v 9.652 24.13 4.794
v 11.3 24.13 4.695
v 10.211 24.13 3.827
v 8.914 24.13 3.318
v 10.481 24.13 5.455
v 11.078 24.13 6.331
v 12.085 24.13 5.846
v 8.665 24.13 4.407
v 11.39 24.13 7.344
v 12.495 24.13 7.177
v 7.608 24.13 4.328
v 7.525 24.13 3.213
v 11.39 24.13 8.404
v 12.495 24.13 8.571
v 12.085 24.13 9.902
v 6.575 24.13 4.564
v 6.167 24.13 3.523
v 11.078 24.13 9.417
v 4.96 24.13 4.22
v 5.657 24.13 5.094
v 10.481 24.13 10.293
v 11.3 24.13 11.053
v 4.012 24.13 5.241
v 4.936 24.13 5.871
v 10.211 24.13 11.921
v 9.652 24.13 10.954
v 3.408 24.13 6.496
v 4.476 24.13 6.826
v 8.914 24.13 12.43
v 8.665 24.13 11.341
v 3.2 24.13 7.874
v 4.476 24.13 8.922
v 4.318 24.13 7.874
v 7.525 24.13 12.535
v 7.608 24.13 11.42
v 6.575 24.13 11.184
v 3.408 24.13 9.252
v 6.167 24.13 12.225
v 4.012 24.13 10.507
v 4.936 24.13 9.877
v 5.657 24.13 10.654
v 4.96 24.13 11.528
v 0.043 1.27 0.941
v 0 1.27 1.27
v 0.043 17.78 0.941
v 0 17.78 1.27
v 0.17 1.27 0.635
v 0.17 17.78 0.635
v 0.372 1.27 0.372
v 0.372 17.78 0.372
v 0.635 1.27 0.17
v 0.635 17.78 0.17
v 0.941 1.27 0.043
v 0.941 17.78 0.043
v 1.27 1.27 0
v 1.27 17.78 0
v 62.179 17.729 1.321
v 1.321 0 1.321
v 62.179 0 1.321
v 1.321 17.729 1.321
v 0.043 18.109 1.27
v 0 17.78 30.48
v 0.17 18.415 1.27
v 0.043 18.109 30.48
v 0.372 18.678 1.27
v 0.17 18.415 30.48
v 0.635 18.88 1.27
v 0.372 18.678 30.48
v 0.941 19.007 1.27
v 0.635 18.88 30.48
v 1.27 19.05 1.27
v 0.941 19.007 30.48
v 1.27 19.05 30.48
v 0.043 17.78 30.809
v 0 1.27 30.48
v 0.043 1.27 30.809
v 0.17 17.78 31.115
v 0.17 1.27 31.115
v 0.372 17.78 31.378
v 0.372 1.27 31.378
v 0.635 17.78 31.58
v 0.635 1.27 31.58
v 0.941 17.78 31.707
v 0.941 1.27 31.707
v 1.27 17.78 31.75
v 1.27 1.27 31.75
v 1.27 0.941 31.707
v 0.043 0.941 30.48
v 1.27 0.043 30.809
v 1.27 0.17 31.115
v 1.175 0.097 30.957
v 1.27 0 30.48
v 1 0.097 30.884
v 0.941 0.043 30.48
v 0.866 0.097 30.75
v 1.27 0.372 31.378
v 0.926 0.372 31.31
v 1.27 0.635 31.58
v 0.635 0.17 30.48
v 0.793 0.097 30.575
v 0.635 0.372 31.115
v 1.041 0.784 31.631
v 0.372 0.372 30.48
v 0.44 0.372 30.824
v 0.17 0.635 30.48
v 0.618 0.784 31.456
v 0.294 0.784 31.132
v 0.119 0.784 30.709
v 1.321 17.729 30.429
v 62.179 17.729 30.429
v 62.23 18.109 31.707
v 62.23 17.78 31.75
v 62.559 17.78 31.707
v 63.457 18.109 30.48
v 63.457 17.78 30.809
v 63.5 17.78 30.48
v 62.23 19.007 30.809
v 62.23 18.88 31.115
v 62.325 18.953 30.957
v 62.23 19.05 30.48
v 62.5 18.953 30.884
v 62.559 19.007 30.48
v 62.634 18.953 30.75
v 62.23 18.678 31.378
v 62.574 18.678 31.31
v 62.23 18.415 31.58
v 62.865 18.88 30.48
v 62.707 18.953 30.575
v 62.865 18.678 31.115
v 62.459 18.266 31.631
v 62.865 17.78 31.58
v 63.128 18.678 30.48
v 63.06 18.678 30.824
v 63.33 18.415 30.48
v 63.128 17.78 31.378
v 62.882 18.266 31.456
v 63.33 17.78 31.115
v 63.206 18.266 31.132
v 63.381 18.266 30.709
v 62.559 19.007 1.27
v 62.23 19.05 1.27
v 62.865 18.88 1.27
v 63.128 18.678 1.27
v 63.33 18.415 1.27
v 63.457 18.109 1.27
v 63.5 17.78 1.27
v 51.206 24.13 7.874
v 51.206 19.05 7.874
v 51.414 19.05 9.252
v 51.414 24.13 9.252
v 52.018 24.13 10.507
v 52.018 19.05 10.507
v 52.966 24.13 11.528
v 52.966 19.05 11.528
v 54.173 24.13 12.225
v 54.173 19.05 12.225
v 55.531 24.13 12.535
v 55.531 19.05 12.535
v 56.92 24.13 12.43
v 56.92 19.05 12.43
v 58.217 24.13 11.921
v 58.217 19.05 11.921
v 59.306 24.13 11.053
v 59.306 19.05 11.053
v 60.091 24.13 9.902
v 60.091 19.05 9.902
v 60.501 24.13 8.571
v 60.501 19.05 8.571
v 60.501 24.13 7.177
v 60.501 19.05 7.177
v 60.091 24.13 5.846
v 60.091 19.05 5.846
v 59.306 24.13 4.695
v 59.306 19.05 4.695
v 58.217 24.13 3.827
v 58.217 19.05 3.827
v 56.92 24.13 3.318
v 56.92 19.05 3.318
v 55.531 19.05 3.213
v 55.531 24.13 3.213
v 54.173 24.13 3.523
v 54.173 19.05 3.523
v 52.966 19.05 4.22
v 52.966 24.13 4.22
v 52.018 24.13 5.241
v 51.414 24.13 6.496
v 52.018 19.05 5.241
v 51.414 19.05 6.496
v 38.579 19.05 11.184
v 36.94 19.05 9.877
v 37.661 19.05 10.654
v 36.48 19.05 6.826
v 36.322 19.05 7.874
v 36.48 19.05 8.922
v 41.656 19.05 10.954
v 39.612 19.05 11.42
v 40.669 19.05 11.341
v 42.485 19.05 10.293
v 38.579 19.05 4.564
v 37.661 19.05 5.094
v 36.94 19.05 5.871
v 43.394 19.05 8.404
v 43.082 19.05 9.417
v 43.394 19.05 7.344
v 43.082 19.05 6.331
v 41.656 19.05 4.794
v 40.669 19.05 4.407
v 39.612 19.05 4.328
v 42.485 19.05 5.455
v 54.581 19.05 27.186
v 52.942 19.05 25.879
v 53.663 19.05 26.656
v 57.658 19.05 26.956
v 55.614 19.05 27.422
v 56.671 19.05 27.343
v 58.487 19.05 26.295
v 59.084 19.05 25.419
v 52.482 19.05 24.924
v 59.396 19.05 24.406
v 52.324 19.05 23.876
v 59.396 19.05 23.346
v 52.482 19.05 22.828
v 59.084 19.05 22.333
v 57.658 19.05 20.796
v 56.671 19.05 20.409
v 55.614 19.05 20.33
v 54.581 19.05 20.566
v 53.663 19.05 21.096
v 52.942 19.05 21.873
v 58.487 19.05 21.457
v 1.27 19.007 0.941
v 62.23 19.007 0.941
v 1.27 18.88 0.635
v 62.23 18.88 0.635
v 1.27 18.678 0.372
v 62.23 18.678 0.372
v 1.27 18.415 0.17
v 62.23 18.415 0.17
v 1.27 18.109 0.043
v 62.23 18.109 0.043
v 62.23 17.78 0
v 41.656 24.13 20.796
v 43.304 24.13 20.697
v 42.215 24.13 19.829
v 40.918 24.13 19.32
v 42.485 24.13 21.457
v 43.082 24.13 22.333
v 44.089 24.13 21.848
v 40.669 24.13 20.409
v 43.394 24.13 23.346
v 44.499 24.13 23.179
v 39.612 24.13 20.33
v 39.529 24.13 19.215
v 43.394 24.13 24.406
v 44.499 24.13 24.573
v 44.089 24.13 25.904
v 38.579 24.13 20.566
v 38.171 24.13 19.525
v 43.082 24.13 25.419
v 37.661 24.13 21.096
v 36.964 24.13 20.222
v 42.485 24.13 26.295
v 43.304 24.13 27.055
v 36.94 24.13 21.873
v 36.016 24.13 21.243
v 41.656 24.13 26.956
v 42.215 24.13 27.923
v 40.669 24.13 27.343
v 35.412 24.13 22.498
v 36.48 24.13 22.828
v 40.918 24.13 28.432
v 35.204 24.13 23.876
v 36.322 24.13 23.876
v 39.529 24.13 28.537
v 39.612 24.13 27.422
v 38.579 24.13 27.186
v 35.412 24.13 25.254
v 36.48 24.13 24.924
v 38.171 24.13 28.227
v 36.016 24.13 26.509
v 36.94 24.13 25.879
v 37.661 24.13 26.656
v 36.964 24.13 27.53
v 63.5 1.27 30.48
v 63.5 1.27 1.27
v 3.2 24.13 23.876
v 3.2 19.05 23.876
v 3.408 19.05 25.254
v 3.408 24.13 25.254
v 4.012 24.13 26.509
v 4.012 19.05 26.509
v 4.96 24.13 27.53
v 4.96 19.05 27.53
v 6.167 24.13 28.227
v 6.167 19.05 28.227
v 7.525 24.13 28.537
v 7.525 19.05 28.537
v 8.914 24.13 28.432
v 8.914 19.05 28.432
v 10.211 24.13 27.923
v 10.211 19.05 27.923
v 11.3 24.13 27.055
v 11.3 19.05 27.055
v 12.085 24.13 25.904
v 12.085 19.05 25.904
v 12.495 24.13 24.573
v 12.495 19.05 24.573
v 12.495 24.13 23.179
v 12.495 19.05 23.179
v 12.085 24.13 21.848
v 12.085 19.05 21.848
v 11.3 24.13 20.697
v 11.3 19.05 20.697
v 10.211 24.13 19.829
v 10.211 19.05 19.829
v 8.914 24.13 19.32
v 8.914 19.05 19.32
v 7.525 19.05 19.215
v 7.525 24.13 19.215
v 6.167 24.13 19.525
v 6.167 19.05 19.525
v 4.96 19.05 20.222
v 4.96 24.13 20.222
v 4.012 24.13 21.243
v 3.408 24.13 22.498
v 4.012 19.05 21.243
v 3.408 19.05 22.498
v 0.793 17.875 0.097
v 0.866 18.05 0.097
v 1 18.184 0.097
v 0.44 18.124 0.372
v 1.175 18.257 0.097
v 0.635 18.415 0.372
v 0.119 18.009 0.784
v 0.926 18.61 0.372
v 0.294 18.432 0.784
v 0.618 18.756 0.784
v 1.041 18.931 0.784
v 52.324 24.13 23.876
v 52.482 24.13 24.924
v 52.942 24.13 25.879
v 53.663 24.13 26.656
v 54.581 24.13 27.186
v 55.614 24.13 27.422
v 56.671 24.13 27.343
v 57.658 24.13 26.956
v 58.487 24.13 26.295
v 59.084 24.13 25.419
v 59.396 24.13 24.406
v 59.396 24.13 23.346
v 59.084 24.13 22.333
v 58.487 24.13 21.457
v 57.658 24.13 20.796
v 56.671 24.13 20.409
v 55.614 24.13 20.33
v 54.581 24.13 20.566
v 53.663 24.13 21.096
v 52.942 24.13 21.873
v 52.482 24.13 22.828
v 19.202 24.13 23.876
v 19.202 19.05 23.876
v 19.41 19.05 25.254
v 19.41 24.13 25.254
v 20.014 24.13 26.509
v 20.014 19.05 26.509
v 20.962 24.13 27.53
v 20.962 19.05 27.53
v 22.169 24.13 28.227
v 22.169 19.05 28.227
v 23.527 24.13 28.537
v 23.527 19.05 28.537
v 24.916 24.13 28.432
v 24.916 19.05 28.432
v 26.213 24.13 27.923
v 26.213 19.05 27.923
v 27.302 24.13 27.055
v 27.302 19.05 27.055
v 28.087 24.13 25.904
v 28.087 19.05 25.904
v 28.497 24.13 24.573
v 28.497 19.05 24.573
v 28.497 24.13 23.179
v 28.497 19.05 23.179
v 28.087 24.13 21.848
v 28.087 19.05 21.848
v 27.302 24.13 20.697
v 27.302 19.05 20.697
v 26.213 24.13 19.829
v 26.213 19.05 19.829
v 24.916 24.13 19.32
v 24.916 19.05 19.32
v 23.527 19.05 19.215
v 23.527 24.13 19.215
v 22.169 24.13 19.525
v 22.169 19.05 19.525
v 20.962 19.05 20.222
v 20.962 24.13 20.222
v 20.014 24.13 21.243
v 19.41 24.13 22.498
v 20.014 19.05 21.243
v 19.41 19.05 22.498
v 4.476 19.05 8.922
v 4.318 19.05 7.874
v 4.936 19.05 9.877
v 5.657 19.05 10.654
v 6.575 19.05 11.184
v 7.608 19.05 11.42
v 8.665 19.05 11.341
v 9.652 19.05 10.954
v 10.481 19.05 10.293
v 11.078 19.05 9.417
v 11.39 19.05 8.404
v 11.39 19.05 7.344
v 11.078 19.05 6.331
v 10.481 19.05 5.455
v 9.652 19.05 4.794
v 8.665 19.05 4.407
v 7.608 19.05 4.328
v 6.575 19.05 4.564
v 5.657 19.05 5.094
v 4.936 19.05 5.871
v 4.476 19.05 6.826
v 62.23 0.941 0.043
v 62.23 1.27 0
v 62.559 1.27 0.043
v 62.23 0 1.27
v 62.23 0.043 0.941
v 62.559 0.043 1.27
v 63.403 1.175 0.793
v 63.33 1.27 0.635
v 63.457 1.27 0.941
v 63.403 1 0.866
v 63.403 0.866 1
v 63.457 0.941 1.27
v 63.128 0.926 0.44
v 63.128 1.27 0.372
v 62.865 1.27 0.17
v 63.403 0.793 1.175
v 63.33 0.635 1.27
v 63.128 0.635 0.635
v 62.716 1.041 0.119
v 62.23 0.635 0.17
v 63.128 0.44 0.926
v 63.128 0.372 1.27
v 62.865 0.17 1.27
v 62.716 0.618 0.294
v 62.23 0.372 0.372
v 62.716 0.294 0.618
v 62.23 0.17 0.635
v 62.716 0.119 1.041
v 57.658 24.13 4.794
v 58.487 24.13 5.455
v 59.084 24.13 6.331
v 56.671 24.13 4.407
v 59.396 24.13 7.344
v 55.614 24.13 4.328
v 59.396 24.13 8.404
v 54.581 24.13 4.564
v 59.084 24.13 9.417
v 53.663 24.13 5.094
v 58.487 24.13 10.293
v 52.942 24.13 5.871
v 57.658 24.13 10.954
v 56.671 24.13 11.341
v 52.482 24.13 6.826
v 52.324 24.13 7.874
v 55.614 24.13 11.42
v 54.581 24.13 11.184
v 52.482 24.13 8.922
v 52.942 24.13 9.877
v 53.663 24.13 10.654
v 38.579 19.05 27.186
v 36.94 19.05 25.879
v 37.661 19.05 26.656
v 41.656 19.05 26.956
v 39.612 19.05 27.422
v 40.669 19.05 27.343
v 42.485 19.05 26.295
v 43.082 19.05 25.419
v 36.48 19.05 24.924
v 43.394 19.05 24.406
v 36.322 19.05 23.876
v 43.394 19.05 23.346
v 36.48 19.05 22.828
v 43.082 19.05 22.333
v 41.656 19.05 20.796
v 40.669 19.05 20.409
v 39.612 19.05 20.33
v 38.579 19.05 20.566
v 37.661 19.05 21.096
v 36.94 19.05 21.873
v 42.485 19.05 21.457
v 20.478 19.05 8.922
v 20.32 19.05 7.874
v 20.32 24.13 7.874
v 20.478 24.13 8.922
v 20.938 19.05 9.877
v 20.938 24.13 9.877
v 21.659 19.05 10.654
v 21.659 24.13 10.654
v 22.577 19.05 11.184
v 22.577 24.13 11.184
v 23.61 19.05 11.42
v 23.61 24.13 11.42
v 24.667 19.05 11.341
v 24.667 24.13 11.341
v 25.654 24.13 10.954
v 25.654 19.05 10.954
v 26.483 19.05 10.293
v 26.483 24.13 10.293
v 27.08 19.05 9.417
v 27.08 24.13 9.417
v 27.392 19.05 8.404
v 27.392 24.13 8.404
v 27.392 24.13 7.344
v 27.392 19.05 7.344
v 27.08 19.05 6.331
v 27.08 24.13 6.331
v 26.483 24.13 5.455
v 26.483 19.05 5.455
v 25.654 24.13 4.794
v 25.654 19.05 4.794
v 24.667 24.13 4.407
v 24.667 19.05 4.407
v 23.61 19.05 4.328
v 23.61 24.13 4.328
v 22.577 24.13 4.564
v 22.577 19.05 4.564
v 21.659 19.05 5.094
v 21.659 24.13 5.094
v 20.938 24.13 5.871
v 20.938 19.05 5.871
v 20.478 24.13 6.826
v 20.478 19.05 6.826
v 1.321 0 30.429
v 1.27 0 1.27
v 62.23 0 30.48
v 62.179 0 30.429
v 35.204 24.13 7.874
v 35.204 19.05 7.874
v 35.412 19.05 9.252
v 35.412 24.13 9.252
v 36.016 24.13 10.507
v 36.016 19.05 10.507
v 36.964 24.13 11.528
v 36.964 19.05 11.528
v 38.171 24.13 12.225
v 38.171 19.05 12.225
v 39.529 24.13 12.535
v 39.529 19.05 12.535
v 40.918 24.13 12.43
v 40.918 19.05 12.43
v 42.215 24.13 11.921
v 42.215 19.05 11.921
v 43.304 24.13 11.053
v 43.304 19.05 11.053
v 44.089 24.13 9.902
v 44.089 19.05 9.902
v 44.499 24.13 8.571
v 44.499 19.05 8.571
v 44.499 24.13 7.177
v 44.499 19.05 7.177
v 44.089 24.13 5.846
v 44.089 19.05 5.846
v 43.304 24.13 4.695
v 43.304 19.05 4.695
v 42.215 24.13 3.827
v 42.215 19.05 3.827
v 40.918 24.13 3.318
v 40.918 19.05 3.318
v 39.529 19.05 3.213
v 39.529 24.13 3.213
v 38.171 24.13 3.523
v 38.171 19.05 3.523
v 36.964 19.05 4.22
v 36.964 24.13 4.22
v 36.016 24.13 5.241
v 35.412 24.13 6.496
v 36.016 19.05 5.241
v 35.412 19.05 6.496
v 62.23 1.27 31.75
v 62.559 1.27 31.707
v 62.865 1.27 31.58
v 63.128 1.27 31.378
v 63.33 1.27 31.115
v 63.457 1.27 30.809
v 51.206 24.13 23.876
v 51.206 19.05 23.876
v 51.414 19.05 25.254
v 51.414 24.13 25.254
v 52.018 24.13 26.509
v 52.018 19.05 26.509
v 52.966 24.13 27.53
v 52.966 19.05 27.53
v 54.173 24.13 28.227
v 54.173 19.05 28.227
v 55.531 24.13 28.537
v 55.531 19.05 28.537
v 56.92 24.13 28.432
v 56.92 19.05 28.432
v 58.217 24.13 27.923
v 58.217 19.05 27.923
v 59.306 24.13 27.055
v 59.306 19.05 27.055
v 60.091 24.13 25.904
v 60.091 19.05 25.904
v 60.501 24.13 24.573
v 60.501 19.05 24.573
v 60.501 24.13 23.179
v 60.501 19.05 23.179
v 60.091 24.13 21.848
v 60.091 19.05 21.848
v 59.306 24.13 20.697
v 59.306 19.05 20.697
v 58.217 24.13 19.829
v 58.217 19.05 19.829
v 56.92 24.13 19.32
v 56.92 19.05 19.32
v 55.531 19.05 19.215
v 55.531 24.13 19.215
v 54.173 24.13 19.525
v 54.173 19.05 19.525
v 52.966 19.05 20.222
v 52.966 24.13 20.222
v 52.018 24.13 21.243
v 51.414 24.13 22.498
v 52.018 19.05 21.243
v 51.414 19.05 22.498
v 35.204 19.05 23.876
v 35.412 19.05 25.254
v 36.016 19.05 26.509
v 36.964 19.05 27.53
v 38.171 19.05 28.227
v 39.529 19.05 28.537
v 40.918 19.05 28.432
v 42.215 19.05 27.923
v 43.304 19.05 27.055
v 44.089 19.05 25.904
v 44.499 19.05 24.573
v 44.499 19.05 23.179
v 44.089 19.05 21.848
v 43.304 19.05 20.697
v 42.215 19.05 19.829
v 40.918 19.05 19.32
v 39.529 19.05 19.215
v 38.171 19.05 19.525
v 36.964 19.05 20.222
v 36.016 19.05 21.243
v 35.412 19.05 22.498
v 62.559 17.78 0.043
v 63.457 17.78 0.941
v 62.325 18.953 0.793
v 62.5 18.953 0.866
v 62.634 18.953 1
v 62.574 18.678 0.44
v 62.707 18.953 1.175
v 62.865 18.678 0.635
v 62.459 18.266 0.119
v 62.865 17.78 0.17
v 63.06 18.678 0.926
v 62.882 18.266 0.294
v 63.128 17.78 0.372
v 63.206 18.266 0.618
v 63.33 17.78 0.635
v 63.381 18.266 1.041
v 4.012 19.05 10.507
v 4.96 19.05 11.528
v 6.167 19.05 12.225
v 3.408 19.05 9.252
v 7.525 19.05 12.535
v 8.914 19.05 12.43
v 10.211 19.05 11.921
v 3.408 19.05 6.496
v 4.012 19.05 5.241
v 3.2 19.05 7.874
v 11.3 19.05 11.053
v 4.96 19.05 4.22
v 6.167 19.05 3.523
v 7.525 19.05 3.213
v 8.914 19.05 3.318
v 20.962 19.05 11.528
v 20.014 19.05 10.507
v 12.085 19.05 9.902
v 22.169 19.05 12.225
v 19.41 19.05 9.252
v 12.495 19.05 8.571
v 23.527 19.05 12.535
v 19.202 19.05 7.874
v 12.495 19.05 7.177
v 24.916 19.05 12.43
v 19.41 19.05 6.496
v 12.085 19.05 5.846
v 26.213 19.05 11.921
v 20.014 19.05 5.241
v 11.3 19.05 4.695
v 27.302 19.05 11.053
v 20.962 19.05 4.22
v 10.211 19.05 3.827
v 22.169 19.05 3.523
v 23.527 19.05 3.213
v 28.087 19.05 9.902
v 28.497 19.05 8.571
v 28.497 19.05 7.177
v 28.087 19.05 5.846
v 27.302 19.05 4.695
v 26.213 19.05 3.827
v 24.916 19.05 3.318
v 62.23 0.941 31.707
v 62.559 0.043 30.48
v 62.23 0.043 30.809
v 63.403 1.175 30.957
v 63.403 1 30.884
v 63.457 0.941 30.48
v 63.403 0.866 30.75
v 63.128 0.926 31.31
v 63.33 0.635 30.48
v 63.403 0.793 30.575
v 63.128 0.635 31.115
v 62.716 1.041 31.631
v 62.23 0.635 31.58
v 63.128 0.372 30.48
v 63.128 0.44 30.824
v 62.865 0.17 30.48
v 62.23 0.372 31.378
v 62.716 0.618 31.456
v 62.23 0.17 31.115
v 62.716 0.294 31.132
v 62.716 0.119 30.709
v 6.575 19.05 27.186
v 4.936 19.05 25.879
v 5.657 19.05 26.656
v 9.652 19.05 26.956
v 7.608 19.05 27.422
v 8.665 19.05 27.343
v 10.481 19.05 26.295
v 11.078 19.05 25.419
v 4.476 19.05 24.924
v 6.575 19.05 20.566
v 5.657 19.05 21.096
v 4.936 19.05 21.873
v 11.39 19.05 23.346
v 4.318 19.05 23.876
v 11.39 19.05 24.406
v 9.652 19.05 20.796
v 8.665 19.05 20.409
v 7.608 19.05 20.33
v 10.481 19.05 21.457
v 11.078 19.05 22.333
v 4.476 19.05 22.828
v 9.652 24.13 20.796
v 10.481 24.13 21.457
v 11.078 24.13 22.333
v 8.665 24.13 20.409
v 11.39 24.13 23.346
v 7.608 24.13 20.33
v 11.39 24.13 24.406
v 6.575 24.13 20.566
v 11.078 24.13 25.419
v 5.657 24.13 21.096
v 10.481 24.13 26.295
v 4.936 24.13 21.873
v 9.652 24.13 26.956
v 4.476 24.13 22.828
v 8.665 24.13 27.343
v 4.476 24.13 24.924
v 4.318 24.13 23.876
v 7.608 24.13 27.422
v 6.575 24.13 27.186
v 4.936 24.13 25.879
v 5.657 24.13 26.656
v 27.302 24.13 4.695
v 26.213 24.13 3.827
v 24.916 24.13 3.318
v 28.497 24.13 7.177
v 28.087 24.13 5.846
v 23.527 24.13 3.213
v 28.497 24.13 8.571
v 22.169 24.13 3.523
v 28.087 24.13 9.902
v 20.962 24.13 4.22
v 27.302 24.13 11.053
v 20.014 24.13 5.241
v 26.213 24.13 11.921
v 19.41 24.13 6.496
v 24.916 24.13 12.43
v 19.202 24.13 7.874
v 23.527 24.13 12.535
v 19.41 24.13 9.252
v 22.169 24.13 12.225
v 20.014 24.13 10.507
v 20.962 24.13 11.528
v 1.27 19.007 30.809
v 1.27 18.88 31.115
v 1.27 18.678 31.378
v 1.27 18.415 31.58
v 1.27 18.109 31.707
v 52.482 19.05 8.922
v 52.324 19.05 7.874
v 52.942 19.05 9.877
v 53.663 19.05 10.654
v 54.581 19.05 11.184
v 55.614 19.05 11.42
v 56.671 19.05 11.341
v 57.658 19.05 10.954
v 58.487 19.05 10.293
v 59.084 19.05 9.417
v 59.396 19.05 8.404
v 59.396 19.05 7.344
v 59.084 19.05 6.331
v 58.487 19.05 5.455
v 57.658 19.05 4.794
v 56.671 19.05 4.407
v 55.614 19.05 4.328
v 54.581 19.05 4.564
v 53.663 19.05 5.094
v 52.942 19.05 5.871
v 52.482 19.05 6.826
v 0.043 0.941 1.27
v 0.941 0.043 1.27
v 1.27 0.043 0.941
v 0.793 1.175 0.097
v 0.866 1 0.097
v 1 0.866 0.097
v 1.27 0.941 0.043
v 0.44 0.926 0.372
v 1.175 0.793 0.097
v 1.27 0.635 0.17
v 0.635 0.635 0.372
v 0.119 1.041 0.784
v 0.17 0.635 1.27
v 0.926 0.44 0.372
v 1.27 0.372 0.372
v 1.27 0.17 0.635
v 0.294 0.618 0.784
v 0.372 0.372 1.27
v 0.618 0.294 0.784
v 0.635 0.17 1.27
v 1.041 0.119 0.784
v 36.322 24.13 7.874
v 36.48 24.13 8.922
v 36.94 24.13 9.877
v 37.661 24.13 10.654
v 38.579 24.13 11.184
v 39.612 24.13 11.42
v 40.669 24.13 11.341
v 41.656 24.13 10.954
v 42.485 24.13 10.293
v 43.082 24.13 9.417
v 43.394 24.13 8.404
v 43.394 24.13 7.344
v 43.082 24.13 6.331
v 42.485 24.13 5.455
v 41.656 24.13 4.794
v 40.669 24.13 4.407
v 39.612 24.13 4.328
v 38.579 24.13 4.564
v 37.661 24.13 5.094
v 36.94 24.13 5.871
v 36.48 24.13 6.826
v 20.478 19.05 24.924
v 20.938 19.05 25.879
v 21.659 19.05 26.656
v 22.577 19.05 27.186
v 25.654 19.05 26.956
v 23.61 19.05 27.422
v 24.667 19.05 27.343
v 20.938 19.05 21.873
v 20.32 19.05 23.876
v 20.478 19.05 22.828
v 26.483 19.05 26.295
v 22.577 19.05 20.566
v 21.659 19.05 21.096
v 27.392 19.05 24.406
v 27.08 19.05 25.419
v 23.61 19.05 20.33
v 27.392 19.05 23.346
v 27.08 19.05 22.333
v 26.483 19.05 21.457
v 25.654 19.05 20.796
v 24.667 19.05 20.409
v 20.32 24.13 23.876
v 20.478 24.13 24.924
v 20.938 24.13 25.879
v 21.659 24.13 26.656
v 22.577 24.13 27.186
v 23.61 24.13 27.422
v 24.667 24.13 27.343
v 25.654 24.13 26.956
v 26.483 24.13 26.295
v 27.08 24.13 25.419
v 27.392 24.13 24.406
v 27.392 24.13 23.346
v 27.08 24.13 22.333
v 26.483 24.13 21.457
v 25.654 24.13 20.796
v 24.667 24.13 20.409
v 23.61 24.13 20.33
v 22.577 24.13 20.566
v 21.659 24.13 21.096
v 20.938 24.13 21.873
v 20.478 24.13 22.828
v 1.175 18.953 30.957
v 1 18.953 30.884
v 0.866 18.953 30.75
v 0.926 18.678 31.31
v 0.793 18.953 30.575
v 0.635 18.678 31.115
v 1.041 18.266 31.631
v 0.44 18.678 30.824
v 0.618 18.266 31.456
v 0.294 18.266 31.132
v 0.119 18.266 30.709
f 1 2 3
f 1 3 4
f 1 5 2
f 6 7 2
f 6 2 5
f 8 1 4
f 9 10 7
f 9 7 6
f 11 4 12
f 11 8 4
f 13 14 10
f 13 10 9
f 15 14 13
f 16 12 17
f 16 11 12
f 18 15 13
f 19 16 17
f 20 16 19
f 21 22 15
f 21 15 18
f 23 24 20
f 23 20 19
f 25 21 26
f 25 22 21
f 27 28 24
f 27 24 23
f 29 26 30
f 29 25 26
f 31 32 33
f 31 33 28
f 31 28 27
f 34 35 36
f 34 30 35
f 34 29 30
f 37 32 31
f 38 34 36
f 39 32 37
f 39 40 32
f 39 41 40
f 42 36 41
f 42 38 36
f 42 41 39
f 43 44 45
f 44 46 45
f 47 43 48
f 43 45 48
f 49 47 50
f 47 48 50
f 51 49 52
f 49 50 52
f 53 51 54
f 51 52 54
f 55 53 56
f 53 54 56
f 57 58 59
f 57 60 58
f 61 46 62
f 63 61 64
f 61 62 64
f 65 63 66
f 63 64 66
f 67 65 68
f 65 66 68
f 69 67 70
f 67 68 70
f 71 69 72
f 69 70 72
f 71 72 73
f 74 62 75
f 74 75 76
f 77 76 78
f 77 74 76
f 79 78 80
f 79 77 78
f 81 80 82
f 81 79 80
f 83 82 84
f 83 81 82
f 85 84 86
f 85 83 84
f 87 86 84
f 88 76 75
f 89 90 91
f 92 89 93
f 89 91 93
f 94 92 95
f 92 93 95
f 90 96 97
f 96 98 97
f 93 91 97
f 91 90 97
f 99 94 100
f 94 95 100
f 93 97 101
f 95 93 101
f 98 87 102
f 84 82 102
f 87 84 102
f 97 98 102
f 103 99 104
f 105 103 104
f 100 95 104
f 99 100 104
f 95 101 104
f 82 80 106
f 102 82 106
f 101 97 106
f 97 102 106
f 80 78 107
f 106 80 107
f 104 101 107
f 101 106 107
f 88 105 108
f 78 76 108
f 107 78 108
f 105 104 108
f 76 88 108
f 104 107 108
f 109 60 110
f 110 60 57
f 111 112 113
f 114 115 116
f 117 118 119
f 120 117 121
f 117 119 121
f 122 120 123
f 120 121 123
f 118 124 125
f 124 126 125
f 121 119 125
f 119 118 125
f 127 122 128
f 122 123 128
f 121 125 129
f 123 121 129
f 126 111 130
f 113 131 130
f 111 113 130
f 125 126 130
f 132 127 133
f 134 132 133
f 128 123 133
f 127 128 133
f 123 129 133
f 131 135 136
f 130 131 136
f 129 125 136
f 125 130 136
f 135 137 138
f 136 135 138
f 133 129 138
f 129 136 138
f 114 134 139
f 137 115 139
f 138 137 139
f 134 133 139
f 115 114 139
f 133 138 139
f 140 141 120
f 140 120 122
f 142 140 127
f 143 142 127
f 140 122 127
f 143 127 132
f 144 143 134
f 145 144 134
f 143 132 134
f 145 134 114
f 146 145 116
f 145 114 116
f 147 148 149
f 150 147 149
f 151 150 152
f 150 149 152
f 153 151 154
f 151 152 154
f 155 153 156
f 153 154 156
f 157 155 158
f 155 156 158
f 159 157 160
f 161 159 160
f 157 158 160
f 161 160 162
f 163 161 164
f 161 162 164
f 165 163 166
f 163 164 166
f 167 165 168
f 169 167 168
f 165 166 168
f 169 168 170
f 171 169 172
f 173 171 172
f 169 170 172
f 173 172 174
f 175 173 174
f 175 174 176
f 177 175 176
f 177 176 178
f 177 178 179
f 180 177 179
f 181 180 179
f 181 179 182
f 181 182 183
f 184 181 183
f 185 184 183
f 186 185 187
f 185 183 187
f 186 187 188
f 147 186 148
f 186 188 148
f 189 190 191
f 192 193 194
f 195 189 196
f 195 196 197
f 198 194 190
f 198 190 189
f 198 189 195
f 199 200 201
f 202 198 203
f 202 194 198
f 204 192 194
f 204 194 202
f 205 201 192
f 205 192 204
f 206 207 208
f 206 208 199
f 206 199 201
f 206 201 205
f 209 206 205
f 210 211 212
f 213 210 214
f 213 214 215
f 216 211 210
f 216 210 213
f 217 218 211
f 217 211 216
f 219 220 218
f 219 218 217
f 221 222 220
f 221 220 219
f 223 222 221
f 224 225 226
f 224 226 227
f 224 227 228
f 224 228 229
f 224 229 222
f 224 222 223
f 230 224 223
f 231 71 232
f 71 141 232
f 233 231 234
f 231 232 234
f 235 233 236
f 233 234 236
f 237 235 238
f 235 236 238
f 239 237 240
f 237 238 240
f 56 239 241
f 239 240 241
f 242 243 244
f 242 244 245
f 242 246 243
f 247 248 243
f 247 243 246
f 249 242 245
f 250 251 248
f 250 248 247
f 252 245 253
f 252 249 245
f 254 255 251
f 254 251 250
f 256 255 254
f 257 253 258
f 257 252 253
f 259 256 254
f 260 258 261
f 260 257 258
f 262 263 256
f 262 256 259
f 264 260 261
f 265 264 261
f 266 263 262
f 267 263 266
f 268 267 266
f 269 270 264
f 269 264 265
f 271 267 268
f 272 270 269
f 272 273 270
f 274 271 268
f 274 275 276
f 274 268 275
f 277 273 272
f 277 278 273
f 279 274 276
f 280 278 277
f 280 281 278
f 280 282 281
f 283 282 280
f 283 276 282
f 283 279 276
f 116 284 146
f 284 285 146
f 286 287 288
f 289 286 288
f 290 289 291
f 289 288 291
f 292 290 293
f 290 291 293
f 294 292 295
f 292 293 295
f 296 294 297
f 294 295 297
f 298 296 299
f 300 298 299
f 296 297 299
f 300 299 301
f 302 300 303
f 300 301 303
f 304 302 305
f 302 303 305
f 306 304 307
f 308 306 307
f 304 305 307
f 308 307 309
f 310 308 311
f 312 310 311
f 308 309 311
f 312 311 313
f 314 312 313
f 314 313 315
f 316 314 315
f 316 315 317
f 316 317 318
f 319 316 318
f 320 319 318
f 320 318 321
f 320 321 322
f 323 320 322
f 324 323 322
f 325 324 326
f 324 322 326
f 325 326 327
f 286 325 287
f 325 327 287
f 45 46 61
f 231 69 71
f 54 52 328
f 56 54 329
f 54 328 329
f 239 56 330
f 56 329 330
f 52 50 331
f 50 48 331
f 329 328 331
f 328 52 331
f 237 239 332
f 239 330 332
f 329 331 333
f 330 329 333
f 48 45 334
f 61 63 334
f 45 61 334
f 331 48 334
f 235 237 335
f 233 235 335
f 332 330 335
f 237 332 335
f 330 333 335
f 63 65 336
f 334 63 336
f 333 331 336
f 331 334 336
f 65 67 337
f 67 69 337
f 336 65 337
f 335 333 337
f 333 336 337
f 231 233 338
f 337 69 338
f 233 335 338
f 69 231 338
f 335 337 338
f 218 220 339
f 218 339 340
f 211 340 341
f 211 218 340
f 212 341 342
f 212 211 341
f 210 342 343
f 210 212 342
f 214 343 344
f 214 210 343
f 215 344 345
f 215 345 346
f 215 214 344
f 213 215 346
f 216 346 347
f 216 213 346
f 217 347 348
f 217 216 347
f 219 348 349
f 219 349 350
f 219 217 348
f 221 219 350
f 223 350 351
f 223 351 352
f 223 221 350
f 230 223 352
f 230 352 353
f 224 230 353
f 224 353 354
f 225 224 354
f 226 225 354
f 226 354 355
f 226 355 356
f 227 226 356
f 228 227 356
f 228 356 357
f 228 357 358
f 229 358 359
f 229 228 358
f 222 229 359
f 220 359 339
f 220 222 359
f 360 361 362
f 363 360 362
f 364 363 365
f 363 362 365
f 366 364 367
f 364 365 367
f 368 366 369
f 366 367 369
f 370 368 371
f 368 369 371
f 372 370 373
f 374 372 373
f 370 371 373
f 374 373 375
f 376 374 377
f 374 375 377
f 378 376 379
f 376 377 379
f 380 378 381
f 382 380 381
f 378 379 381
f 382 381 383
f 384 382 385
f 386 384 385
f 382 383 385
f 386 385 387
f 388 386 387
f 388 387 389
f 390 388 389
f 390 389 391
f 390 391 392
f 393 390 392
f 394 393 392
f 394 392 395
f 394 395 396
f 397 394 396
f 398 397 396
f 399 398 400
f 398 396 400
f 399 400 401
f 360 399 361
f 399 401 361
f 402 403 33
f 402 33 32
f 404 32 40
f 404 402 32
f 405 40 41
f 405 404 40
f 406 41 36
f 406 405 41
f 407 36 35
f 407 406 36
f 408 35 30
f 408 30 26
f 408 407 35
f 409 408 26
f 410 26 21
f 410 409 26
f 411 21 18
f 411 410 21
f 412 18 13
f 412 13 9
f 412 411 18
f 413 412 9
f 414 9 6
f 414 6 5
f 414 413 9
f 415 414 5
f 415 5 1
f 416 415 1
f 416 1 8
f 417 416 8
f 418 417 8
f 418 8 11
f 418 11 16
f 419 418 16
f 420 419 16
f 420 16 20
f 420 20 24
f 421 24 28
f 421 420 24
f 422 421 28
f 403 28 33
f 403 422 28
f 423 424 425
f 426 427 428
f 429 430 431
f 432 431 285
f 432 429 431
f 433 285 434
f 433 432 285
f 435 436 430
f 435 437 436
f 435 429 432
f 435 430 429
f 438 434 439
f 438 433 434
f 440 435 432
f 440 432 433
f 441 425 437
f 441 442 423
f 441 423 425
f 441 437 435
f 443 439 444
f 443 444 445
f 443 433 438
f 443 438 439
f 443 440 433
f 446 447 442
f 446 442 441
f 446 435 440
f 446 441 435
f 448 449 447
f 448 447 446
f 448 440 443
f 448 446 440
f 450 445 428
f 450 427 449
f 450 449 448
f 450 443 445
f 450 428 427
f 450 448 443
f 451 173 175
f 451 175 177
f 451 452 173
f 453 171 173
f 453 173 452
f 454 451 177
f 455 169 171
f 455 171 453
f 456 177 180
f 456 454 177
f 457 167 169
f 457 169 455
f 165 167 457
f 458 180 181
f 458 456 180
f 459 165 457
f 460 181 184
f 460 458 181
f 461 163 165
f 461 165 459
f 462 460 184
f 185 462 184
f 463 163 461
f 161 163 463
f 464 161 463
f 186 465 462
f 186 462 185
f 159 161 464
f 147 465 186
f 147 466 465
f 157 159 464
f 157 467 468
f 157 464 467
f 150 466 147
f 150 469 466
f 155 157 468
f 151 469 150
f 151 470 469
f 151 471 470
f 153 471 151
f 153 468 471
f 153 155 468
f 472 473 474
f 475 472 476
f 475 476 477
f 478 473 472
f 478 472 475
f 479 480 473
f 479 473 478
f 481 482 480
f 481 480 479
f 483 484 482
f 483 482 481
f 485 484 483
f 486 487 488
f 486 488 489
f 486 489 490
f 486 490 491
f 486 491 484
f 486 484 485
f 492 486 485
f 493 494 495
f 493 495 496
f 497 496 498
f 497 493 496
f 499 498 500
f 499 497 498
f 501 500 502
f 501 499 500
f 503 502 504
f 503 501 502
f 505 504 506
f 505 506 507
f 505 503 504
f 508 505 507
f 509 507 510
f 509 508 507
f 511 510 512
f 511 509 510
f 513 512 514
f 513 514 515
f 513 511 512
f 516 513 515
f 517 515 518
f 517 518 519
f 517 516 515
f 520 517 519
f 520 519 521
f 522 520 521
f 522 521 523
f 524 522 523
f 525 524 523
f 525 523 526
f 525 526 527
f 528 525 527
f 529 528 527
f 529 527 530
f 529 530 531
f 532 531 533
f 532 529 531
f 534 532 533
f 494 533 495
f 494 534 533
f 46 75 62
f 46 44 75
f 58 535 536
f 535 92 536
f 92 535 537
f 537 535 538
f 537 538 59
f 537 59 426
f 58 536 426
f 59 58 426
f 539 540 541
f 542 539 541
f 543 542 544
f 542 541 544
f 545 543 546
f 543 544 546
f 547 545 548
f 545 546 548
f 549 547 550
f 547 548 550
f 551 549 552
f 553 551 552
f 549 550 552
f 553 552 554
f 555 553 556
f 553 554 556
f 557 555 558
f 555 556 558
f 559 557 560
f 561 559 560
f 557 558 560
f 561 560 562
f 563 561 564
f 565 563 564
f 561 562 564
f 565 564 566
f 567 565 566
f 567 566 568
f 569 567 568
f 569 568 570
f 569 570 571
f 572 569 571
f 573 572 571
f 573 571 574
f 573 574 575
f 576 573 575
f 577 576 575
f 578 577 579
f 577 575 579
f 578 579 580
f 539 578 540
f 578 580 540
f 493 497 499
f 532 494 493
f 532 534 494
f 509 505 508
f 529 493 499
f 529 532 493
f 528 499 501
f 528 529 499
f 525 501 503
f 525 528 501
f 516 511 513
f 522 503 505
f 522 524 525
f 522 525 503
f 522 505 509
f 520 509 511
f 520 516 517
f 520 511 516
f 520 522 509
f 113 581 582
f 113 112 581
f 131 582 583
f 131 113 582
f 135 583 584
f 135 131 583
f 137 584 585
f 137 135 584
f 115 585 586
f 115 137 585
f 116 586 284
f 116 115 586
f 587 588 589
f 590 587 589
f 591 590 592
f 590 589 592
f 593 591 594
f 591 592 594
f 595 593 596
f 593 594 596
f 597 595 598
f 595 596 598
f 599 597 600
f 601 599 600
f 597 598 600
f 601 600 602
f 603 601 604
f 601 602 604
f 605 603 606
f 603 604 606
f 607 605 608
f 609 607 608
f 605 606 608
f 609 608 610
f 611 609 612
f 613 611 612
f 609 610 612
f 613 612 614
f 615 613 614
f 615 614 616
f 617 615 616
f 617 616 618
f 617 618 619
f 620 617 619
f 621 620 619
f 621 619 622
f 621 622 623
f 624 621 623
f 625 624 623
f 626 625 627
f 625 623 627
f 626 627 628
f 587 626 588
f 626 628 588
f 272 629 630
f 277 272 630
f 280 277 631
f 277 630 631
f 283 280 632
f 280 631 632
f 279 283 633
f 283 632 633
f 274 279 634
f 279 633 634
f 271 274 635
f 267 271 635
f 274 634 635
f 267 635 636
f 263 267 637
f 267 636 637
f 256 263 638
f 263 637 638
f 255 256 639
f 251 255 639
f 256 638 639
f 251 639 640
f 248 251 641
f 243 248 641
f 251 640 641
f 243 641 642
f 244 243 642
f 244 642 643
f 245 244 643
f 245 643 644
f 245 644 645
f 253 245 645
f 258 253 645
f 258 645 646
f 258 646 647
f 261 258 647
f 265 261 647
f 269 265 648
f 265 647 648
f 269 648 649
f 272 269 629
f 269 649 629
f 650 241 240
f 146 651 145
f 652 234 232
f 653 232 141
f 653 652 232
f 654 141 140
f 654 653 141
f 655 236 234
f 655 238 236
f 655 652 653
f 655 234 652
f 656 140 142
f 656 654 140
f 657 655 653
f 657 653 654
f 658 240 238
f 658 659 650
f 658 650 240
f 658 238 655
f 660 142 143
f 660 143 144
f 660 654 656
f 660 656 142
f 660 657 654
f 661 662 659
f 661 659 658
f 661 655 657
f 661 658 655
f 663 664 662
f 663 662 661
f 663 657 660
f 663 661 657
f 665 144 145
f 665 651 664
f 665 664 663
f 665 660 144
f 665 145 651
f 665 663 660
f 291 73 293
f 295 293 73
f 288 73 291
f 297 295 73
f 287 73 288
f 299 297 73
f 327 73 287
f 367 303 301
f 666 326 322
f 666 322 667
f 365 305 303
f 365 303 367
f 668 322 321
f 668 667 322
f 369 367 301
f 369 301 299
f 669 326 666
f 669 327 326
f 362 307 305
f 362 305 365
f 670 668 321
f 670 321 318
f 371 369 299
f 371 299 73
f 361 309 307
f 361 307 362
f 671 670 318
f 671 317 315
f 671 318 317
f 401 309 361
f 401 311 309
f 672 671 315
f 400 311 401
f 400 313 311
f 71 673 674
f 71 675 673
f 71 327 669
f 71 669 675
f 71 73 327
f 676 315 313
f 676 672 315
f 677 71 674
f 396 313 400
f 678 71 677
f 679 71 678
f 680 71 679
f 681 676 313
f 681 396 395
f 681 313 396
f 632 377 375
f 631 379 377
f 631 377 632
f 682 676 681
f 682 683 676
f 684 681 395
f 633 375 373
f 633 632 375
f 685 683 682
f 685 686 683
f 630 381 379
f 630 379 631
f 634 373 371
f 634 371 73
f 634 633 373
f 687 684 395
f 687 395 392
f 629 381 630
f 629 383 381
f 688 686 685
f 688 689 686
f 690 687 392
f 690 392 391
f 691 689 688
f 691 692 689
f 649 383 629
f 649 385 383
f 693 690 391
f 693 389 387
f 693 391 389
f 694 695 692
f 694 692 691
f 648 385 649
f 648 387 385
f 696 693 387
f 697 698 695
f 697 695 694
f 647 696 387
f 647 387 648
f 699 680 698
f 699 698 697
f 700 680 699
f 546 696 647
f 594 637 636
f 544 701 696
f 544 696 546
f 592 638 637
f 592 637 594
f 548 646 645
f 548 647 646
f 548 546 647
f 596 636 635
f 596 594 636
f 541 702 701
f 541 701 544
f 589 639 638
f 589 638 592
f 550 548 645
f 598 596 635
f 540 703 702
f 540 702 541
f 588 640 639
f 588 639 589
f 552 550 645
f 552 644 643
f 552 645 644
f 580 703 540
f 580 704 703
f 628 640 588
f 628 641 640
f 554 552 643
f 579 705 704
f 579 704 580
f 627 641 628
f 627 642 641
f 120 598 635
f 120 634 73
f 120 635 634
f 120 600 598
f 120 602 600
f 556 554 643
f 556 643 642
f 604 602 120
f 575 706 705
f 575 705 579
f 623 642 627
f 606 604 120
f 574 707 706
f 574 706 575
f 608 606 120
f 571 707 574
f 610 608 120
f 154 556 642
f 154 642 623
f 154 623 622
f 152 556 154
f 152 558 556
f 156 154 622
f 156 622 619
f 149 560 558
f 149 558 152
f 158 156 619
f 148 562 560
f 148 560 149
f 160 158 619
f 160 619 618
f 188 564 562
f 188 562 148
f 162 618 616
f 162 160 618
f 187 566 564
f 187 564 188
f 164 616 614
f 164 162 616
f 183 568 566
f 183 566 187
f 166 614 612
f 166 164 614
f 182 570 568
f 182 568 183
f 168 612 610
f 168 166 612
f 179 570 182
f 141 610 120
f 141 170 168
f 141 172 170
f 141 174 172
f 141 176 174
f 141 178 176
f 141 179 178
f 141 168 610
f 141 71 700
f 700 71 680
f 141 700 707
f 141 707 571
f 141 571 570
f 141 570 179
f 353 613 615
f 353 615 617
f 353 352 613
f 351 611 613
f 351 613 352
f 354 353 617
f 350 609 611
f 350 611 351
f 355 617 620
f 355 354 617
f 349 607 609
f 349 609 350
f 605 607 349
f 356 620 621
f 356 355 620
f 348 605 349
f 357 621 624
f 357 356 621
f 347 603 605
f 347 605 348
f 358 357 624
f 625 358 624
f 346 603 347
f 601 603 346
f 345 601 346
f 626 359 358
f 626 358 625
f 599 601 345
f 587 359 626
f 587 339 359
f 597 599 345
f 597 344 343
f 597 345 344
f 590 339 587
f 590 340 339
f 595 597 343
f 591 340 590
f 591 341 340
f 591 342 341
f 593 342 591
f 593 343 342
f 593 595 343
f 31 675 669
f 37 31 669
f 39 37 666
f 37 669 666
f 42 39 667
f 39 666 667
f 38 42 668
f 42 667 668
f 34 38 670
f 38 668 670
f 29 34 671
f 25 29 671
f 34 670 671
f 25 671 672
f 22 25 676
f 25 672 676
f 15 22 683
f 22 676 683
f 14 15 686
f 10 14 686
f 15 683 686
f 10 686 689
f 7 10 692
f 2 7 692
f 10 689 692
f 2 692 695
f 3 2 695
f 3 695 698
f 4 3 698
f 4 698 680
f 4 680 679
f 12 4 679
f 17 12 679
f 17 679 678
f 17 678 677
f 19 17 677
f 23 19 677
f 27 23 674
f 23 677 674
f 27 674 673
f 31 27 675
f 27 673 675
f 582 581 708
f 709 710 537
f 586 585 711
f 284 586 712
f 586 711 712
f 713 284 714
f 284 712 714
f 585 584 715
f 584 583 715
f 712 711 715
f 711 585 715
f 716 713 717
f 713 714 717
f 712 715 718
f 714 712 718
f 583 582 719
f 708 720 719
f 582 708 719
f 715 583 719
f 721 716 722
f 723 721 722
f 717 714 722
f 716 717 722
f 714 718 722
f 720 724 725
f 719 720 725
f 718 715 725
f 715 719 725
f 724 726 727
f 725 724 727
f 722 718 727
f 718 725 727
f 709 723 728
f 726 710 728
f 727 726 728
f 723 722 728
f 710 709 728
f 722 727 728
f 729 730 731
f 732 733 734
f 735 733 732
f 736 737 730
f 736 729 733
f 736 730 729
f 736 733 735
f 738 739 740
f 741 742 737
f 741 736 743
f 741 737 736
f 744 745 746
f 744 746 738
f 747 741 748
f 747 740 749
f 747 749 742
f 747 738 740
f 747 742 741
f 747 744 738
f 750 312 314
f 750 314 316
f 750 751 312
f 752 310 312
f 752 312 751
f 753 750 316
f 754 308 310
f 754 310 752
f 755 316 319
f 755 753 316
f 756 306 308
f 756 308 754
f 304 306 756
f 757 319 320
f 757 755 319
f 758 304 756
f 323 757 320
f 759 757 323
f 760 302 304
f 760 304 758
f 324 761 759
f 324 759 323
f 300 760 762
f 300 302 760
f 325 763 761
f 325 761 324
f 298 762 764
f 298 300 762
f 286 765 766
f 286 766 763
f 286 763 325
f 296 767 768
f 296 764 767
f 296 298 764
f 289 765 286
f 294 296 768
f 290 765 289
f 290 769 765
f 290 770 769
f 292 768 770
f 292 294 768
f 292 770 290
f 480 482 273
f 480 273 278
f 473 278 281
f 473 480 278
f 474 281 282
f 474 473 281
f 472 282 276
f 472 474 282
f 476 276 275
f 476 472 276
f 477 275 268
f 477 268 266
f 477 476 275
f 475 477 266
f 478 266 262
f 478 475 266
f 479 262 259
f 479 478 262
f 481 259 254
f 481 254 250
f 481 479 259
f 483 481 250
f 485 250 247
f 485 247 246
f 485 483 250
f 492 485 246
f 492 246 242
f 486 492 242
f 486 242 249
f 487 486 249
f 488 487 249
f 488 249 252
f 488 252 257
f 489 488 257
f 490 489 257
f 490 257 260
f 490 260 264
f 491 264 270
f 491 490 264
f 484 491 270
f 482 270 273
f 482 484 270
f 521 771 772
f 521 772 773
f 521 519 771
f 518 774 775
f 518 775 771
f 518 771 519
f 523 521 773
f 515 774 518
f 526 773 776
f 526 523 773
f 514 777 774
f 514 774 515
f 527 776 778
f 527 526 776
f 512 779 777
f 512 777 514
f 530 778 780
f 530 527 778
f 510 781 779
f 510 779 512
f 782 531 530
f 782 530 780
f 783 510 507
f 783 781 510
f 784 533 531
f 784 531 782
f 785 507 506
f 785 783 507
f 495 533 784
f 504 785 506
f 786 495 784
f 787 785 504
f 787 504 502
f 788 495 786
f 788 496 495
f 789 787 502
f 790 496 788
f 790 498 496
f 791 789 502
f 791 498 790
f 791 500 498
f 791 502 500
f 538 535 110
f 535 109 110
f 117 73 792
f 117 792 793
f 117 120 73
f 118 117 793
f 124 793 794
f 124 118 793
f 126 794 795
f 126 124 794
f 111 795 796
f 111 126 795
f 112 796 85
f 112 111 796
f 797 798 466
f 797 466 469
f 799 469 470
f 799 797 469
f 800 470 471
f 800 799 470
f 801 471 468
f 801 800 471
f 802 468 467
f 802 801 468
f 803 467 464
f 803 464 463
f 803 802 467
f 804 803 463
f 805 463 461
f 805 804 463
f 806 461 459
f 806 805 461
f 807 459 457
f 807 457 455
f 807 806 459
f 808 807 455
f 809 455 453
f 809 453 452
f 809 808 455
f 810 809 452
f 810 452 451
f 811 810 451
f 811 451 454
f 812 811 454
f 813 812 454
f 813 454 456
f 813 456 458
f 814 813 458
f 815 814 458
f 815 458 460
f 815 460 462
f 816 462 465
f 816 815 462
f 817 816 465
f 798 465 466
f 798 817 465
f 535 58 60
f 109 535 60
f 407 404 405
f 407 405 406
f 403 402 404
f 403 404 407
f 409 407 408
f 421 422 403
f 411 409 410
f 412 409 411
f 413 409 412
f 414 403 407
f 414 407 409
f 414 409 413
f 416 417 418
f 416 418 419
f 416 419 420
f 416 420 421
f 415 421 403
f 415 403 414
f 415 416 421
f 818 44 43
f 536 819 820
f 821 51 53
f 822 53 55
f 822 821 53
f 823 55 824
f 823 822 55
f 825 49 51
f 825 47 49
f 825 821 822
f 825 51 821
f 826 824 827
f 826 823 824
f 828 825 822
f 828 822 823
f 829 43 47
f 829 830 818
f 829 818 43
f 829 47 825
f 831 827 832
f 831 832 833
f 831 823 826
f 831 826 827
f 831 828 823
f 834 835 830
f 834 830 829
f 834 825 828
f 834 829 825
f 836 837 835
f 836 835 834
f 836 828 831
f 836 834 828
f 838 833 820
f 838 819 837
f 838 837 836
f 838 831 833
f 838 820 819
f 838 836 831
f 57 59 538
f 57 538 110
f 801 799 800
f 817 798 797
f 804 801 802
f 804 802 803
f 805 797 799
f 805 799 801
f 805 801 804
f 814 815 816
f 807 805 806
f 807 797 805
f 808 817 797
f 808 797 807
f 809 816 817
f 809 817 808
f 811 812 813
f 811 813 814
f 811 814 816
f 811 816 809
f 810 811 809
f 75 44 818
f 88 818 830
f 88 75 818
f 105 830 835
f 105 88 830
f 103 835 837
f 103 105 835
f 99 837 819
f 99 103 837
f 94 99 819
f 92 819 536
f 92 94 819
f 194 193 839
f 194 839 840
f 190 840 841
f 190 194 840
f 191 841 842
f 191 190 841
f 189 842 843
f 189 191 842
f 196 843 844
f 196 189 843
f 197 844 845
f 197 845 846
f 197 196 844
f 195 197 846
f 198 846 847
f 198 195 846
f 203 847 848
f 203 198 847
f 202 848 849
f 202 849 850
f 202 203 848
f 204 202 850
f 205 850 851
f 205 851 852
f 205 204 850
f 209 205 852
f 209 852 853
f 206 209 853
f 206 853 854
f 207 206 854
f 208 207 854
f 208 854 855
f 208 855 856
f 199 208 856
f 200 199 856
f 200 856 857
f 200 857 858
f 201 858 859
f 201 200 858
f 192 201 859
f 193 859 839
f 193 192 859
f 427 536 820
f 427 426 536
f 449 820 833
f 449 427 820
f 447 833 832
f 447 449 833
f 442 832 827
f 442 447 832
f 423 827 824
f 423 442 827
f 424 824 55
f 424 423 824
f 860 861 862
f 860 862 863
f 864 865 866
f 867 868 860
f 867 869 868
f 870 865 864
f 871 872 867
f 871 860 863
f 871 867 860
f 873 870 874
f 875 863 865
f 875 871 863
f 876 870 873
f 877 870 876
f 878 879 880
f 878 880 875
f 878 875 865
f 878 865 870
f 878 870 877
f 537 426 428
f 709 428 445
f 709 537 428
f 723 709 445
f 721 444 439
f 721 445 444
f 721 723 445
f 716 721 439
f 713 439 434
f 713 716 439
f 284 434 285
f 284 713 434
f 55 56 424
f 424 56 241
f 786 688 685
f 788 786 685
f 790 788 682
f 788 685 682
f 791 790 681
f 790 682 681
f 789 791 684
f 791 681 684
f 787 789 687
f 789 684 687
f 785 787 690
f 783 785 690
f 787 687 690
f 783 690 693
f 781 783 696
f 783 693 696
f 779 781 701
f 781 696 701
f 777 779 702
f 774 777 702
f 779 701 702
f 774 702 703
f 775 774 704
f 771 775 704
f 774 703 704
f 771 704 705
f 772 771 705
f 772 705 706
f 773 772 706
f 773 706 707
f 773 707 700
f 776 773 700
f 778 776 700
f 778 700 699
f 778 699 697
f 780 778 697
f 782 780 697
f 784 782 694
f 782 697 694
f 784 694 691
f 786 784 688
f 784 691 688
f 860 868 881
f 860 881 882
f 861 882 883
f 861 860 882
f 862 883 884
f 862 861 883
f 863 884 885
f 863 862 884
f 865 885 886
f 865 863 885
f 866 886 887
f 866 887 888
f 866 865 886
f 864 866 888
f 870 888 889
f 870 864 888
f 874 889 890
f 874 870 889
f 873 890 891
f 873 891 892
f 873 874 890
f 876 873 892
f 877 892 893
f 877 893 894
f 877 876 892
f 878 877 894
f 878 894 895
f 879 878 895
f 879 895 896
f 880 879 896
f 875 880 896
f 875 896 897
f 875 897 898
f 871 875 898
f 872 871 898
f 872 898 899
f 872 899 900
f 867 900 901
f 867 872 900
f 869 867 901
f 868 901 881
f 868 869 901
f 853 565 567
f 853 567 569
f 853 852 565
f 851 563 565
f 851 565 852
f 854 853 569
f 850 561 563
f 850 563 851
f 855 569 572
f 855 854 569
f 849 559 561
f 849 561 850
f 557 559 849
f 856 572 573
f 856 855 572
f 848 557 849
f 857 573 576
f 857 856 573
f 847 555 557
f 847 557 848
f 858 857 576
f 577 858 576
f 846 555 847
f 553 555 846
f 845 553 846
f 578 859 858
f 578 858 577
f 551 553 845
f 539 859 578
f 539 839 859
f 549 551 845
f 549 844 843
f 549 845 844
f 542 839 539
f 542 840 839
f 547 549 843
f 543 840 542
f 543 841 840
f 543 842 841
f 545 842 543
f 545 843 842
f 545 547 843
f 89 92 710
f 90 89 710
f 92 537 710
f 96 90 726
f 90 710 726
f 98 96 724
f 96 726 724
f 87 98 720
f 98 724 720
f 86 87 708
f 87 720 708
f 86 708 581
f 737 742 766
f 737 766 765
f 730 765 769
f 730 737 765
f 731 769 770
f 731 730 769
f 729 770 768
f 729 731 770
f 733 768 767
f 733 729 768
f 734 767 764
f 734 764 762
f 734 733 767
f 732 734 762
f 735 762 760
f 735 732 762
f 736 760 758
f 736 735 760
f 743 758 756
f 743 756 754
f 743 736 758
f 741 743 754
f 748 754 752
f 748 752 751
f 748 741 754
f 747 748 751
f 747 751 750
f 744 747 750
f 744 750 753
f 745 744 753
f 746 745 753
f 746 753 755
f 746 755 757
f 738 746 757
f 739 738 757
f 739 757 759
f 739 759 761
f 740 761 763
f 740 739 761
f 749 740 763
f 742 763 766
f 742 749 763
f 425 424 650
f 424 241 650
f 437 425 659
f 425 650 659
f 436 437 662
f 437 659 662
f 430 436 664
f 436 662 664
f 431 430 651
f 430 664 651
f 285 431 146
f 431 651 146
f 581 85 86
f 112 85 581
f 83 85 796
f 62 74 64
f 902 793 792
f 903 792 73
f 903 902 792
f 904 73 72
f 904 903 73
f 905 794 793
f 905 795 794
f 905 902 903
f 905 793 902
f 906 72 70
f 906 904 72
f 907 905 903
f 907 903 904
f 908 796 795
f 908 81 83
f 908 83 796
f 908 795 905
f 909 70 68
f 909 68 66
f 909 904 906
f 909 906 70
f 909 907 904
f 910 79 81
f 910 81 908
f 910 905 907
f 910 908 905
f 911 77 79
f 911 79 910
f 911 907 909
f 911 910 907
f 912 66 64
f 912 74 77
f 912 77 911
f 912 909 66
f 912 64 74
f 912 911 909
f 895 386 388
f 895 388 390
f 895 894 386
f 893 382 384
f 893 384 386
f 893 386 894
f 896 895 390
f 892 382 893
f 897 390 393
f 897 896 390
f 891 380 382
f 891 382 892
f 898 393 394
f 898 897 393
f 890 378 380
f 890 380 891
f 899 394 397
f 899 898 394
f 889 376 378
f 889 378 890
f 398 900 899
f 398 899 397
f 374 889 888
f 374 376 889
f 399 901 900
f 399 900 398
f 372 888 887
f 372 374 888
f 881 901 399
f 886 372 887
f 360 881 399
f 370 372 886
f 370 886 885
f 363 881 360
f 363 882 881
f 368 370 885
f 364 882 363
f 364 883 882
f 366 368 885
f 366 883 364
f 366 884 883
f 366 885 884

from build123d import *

# Parameters (mm, degrees)
F0_W     = 63.5
F0_H     = 19.05
F1_DEPTH = 31.75
F2_T     = -1.3208
F3_R     = 4.6736
F3_R_2   = 3.556
F4_DEPTH = 5.08
F5_R     = 1.27


with BuildPart() as f1:
    # F0 (on Top) → F1 (new body)
    with BuildSketch(Plane.XY):
        with Locations((31.75, 9.525)):
            Rectangle(F0_W, F0_H)
    extrude(amount=F1_DEPTH)

    # F2
    f2_openings = [f1.faces().sort_by_distance(p)[0] for p in [
        (31.75, 0, 15.875),
    ]]
    offset(amount=F2_T, openings=f2_openings)

    # F3 (on face) → F4 (join)
    with BuildSketch(Plane(origin=(0, 19.05, 0), x_dir=(-1, 0, 0), z_dir=(0, 1, 0))):
        with Locations((-7.874, 23.876)):
            Circle(F3_R)
        with Locations((-7.874, 23.876)):
            Circle(F3_R_2, mode=Mode.SUBTRACT)
        with Locations((-23.876, 23.876)):
            Circle(F3_R)
        with Locations((-23.876, 23.876)):
            Circle(F3_R_2, mode=Mode.SUBTRACT)
        with Locations((-39.878, 23.876)):
            Circle(F3_R)
        with Locations((-39.878, 23.876)):
            Circle(F3_R_2, mode=Mode.SUBTRACT)
        with Locations((-55.88, 23.876)):
            Circle(F3_R)
        with Locations((-55.88, 23.876)):
            Circle(F3_R_2, mode=Mode.SUBTRACT)
        with Locations((-55.88, 7.874)):
            Circle(F3_R)
        with Locations((-55.88, 7.874)):
            Circle(F3_R_2, mode=Mode.SUBTRACT)
        with Locations((-39.878, 7.874)):
            Circle(F3_R)
        with Locations((-39.878, 7.874)):
            Circle(F3_R_2, mode=Mode.SUBTRACT)
        with Locations((-23.876, 7.874)):
            Circle(F3_R)
        with Locations((-23.876, 7.874)):
            Circle(F3_R_2, mode=Mode.SUBTRACT)
        with Locations((-7.874, 7.874)):
            Circle(F3_R)
        with Locations((-7.874, 7.874)):
            Circle(F3_R_2, mode=Mode.SUBTRACT)
    extrude(amount=F4_DEPTH)

    # F5
    f5_edges = [f1.edges().sort_by_distance(p)[0] for p in [
        (0, 9.525, 31.75),
        (31.75, 0, 31.75),
        (63.5, 9.525, 31.75),
        (31.75, 19.05, 31.75),
        (0, 19.05, 15.875),
        (0, 0, 15.875),
        (0, 9.525, 0),
        (31.75, 0, 0),
        (63.5, 9.525, 0),
        (31.75, 19.05, 0),
        (63.5, 0, 15.875),
        (63.5, 19.05, 15.875),
    ]]
    fillet(f5_edges, radius=F5_R)


solid = f1.part
